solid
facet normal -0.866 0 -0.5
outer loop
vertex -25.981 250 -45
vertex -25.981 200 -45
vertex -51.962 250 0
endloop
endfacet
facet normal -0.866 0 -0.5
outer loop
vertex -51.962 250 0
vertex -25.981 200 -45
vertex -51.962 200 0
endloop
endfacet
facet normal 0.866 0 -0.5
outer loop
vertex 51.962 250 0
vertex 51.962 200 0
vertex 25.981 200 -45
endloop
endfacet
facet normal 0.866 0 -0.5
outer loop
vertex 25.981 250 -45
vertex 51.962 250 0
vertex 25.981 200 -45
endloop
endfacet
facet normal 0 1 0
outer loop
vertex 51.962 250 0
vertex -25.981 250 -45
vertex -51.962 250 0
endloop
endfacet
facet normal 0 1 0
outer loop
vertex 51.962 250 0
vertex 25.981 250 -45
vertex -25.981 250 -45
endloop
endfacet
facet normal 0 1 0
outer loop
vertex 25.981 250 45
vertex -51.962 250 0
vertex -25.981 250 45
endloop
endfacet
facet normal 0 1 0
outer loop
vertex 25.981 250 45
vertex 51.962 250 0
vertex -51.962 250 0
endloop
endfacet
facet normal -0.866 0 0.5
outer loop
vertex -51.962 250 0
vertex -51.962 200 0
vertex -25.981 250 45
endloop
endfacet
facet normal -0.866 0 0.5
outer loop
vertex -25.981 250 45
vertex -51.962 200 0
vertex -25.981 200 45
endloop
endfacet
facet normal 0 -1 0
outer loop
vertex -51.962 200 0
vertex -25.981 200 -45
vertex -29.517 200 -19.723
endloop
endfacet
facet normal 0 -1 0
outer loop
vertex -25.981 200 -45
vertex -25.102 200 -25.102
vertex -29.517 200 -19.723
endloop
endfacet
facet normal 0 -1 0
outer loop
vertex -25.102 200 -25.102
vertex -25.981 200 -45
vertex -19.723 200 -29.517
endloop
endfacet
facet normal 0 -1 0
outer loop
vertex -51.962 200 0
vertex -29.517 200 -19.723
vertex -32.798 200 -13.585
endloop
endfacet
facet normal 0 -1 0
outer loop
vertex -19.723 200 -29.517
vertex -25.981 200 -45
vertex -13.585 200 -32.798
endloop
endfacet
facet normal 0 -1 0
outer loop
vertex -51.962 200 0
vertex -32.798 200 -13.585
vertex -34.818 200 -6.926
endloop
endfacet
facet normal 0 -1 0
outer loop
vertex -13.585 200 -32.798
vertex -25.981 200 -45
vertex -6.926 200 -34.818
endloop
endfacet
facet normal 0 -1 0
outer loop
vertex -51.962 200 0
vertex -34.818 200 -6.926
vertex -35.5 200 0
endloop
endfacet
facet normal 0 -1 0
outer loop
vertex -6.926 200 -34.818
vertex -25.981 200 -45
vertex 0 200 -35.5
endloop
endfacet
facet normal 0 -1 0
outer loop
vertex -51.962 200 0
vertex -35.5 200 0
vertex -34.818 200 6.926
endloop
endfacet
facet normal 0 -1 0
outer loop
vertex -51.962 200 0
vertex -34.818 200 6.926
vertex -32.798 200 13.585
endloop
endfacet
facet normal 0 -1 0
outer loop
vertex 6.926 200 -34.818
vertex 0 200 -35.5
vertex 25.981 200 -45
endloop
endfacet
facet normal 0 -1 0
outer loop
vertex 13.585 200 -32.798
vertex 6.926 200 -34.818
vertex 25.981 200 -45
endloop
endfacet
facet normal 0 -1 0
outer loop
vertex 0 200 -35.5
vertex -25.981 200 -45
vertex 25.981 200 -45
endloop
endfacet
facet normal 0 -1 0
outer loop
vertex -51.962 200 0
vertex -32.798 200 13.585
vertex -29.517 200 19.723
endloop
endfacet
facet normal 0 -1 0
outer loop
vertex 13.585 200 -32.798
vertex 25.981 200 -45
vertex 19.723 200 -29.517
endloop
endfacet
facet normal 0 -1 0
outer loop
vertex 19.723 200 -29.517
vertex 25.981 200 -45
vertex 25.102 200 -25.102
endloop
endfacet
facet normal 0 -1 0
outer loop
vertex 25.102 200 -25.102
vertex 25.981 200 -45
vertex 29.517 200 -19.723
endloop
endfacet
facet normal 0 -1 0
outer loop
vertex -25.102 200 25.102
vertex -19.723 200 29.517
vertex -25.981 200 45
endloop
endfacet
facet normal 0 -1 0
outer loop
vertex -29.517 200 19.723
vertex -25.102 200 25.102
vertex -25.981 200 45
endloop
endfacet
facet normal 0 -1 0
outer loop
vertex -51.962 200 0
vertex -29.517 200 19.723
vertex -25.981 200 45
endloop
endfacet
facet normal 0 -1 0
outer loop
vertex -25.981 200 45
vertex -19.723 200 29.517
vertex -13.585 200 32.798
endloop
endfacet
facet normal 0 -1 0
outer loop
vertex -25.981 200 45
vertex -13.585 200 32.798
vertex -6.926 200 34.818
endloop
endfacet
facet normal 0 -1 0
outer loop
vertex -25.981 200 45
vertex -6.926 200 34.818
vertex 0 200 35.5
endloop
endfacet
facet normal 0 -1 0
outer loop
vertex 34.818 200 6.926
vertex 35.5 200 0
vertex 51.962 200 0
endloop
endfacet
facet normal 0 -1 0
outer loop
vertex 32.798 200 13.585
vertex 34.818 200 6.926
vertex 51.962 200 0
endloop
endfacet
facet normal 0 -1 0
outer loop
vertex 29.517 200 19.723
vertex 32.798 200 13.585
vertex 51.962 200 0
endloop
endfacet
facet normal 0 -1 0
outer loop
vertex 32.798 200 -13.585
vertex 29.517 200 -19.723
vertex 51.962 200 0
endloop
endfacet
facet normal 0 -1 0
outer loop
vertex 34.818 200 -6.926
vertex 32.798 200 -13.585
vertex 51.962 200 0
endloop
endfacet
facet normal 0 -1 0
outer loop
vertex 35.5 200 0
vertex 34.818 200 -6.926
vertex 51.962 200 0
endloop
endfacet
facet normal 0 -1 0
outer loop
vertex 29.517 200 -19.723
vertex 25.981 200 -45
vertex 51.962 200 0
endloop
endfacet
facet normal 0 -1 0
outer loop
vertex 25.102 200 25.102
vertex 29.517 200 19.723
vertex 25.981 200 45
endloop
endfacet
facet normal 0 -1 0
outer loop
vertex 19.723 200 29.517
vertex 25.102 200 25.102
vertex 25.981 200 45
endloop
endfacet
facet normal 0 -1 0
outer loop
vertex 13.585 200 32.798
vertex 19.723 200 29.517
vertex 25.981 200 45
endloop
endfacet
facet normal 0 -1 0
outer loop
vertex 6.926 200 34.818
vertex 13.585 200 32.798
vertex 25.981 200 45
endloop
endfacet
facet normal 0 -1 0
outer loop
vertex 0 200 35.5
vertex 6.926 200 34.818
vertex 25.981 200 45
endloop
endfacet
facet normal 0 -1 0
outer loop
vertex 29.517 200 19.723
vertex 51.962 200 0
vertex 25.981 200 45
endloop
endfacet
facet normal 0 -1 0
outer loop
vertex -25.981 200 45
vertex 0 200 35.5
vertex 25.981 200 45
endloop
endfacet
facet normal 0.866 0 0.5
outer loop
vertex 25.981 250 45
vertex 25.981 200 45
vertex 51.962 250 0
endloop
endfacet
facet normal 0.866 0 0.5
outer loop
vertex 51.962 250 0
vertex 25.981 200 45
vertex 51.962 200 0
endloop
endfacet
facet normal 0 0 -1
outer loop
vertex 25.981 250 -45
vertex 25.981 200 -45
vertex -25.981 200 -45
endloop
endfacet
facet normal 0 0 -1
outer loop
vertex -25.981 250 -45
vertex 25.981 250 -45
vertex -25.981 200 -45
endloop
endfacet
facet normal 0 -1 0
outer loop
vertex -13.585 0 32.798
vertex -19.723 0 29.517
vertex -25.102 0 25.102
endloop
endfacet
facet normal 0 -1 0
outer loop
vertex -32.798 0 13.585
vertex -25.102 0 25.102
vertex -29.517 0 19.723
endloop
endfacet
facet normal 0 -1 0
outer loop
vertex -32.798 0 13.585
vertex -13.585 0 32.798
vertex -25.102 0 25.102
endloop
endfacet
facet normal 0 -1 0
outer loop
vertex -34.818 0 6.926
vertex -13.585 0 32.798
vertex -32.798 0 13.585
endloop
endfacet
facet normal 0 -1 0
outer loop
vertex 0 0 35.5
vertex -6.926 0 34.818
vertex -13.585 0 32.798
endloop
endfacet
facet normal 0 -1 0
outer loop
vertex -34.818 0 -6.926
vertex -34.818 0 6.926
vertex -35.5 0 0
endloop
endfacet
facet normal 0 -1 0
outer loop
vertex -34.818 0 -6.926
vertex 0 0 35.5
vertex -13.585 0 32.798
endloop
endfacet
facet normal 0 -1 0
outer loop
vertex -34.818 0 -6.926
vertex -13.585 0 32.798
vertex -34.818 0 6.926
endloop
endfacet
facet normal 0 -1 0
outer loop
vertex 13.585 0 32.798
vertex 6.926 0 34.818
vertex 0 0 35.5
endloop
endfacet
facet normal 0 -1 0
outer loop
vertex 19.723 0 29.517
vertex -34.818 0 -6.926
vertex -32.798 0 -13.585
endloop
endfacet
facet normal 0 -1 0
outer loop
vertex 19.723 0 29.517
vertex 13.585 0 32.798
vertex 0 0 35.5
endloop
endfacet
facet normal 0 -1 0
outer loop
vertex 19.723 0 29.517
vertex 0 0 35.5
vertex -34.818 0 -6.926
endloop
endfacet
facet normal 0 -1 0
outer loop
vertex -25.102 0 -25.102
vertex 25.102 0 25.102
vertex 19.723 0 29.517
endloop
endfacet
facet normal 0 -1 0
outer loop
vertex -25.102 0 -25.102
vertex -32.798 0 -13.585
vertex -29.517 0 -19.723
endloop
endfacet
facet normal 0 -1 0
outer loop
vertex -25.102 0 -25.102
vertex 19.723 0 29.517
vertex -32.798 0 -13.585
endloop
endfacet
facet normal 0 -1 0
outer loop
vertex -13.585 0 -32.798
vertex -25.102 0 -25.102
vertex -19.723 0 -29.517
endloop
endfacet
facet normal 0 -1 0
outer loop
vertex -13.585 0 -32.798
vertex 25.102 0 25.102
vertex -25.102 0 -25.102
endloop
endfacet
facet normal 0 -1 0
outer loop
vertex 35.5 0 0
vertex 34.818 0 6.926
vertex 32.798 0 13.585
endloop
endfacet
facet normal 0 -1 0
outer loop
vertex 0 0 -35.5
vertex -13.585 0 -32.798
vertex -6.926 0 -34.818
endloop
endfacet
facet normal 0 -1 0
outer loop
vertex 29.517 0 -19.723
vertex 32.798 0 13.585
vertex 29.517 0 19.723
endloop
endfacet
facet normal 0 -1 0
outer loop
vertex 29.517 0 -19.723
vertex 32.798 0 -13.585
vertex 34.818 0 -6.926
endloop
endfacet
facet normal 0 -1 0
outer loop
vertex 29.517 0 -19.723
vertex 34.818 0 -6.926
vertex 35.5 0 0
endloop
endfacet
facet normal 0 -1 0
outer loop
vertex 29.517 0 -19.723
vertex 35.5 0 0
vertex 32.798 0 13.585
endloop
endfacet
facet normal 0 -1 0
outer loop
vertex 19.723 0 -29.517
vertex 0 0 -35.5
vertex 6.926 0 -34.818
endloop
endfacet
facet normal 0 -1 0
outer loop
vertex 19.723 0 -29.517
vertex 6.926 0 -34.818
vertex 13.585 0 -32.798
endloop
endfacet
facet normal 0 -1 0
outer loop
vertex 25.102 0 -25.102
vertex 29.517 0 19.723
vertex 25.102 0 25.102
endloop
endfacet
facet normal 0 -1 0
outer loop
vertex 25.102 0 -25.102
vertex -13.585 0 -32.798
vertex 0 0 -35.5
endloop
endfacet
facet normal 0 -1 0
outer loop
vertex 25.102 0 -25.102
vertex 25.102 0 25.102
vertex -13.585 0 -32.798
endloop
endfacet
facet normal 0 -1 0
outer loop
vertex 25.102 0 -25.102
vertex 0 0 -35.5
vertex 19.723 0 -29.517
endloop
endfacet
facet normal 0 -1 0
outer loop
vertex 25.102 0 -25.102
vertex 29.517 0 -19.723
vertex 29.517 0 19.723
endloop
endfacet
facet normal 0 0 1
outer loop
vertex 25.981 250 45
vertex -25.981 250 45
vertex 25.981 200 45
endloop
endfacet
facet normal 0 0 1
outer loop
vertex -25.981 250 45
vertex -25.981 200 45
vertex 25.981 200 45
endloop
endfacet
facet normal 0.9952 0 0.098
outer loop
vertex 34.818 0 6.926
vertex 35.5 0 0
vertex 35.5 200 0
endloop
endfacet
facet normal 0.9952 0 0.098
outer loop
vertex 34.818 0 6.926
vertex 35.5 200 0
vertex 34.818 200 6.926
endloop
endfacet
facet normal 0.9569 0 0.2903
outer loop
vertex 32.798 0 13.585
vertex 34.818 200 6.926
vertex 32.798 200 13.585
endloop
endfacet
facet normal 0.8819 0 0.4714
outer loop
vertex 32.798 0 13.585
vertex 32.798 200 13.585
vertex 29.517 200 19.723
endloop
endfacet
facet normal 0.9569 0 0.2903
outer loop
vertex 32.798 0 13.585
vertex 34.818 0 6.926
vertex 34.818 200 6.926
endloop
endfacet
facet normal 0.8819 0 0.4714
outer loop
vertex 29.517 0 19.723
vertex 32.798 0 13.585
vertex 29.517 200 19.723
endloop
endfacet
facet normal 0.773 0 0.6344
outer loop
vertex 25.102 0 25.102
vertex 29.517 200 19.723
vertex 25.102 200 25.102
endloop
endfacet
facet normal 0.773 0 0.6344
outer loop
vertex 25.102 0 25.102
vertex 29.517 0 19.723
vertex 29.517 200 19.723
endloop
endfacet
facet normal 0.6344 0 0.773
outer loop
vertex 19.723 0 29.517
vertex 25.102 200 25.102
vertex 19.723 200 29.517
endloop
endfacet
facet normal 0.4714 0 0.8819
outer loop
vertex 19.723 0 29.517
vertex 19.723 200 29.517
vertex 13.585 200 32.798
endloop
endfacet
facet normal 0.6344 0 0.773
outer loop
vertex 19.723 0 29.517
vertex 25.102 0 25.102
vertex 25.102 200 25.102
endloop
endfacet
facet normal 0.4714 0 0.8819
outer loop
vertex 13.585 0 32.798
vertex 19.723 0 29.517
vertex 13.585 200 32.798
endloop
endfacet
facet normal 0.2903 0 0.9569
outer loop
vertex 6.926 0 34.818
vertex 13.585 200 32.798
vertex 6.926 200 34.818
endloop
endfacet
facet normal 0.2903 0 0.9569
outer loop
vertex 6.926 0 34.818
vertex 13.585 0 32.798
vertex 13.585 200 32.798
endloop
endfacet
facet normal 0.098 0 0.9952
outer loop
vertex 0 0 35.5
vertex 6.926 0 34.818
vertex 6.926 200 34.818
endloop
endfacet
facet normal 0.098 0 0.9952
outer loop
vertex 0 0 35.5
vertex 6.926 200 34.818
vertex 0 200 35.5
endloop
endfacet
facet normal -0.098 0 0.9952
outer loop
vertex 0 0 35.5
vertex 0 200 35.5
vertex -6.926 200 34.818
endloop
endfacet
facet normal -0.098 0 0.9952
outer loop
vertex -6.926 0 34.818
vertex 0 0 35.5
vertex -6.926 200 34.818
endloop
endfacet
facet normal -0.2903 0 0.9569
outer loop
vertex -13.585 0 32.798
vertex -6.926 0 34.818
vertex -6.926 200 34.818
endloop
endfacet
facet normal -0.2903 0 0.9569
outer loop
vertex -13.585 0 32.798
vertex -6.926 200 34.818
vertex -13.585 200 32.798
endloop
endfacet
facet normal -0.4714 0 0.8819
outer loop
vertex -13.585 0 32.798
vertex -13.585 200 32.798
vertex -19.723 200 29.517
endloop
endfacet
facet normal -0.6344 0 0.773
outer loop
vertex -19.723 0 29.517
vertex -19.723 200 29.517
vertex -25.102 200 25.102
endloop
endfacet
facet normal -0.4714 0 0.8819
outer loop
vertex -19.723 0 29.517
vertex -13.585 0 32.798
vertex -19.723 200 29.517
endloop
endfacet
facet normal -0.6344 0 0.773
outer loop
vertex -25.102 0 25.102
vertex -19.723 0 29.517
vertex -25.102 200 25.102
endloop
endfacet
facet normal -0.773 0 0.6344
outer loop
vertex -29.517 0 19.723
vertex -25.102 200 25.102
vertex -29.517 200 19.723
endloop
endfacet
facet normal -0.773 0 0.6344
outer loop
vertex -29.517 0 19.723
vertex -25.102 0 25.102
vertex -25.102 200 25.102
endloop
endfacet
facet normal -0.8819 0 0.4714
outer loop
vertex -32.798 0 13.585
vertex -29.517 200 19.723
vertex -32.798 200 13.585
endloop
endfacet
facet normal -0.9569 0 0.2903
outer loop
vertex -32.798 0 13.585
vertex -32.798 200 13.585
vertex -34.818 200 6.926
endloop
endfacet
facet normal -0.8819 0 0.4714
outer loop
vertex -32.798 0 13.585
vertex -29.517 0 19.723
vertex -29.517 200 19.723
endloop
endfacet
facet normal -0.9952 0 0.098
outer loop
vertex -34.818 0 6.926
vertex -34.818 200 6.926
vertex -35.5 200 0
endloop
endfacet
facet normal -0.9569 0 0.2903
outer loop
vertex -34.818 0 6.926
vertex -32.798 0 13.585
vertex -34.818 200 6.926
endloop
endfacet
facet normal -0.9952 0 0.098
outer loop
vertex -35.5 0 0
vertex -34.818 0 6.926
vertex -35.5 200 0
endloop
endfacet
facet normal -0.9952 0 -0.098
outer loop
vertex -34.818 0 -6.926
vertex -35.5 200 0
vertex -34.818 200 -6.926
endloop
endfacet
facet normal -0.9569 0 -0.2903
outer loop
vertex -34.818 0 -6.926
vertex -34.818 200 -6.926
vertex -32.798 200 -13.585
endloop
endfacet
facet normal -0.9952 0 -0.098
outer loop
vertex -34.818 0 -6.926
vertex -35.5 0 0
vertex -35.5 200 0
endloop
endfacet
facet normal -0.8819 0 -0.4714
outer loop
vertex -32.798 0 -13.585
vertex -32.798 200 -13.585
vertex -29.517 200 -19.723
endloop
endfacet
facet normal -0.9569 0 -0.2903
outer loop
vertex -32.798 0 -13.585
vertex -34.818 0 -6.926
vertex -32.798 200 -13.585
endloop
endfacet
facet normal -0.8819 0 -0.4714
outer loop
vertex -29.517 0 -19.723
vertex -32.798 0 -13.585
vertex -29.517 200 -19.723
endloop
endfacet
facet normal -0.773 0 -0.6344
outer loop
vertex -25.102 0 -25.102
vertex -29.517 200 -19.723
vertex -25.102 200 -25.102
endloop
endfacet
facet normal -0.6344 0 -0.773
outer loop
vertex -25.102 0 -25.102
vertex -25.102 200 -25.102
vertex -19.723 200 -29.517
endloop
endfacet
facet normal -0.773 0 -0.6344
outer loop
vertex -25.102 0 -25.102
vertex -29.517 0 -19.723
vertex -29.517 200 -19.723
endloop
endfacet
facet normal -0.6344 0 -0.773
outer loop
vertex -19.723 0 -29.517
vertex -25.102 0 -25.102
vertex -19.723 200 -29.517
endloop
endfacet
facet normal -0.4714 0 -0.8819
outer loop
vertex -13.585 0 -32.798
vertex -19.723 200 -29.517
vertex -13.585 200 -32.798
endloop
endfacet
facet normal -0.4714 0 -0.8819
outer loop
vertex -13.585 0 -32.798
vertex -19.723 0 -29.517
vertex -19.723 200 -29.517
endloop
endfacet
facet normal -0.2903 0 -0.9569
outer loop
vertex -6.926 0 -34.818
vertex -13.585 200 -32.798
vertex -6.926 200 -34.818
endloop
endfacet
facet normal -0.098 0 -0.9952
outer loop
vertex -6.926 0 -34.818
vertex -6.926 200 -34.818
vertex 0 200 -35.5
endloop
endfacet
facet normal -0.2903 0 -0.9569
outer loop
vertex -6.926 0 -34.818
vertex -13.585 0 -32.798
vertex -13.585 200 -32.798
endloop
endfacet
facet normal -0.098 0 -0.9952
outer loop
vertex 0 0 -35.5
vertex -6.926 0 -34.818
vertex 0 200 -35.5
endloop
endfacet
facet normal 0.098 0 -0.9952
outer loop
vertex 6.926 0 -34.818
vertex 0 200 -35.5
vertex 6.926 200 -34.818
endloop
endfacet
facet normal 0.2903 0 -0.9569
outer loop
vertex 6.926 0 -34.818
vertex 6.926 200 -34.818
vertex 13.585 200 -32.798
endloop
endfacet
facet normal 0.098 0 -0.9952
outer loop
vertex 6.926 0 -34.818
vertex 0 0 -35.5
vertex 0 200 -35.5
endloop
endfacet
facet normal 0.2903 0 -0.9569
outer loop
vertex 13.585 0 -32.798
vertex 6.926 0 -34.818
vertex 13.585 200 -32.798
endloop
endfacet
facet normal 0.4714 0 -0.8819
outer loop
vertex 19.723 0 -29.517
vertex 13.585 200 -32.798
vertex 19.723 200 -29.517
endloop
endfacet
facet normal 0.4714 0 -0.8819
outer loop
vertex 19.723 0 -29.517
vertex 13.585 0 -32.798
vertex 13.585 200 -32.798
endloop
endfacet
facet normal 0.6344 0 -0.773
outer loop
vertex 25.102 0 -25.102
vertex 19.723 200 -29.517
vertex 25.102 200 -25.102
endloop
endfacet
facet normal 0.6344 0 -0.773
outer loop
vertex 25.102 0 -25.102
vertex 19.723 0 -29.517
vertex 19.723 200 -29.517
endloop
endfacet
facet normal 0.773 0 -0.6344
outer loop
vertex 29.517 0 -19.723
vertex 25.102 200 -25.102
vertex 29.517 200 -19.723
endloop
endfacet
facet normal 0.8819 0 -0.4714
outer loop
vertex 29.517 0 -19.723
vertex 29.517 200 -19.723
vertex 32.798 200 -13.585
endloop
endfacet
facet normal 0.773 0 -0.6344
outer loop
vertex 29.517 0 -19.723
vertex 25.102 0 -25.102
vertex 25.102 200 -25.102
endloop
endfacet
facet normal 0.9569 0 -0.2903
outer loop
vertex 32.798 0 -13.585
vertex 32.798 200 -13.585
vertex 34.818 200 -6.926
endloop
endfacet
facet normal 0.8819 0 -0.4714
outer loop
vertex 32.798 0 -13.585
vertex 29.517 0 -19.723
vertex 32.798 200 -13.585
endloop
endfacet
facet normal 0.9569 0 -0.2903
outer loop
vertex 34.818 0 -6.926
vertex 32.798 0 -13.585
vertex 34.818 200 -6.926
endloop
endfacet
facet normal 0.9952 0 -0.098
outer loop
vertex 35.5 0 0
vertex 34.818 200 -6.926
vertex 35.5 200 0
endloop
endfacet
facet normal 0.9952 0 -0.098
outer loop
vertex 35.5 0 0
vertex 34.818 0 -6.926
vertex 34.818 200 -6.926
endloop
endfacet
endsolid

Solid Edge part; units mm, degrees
sketch "Sketch1" plane through (0, 0, 0) normal (0, -1, 0) x (1, 0, 0)
  circle A0 centre (0, 0) radius 35.5
extrude "Protrusion1" add sketch "Sketch1" against normal blind 200
sketch "Sketch2" plane through (0, 200, 0) normal (0, 1, 0) x (-1, 0, 0)
  line L0 (25.9808, 45) -> (-25.9808, 45)
  line L1 (-25.9808, 45) -> (-51.9615, 0)
  line L2 (-51.9615, 0) -> (-25.9808, -45)
  line L3 (-25.9808, -45) -> (25.9808, -45)
  line L4 (25.9808, -45) -> (51.9615, 0)
  line L5 (51.9615, 0) -> (25.9808, 45)
extrude "ProtrusiónExtruida_3" add sketch "Sketch2" along normal blind 50
